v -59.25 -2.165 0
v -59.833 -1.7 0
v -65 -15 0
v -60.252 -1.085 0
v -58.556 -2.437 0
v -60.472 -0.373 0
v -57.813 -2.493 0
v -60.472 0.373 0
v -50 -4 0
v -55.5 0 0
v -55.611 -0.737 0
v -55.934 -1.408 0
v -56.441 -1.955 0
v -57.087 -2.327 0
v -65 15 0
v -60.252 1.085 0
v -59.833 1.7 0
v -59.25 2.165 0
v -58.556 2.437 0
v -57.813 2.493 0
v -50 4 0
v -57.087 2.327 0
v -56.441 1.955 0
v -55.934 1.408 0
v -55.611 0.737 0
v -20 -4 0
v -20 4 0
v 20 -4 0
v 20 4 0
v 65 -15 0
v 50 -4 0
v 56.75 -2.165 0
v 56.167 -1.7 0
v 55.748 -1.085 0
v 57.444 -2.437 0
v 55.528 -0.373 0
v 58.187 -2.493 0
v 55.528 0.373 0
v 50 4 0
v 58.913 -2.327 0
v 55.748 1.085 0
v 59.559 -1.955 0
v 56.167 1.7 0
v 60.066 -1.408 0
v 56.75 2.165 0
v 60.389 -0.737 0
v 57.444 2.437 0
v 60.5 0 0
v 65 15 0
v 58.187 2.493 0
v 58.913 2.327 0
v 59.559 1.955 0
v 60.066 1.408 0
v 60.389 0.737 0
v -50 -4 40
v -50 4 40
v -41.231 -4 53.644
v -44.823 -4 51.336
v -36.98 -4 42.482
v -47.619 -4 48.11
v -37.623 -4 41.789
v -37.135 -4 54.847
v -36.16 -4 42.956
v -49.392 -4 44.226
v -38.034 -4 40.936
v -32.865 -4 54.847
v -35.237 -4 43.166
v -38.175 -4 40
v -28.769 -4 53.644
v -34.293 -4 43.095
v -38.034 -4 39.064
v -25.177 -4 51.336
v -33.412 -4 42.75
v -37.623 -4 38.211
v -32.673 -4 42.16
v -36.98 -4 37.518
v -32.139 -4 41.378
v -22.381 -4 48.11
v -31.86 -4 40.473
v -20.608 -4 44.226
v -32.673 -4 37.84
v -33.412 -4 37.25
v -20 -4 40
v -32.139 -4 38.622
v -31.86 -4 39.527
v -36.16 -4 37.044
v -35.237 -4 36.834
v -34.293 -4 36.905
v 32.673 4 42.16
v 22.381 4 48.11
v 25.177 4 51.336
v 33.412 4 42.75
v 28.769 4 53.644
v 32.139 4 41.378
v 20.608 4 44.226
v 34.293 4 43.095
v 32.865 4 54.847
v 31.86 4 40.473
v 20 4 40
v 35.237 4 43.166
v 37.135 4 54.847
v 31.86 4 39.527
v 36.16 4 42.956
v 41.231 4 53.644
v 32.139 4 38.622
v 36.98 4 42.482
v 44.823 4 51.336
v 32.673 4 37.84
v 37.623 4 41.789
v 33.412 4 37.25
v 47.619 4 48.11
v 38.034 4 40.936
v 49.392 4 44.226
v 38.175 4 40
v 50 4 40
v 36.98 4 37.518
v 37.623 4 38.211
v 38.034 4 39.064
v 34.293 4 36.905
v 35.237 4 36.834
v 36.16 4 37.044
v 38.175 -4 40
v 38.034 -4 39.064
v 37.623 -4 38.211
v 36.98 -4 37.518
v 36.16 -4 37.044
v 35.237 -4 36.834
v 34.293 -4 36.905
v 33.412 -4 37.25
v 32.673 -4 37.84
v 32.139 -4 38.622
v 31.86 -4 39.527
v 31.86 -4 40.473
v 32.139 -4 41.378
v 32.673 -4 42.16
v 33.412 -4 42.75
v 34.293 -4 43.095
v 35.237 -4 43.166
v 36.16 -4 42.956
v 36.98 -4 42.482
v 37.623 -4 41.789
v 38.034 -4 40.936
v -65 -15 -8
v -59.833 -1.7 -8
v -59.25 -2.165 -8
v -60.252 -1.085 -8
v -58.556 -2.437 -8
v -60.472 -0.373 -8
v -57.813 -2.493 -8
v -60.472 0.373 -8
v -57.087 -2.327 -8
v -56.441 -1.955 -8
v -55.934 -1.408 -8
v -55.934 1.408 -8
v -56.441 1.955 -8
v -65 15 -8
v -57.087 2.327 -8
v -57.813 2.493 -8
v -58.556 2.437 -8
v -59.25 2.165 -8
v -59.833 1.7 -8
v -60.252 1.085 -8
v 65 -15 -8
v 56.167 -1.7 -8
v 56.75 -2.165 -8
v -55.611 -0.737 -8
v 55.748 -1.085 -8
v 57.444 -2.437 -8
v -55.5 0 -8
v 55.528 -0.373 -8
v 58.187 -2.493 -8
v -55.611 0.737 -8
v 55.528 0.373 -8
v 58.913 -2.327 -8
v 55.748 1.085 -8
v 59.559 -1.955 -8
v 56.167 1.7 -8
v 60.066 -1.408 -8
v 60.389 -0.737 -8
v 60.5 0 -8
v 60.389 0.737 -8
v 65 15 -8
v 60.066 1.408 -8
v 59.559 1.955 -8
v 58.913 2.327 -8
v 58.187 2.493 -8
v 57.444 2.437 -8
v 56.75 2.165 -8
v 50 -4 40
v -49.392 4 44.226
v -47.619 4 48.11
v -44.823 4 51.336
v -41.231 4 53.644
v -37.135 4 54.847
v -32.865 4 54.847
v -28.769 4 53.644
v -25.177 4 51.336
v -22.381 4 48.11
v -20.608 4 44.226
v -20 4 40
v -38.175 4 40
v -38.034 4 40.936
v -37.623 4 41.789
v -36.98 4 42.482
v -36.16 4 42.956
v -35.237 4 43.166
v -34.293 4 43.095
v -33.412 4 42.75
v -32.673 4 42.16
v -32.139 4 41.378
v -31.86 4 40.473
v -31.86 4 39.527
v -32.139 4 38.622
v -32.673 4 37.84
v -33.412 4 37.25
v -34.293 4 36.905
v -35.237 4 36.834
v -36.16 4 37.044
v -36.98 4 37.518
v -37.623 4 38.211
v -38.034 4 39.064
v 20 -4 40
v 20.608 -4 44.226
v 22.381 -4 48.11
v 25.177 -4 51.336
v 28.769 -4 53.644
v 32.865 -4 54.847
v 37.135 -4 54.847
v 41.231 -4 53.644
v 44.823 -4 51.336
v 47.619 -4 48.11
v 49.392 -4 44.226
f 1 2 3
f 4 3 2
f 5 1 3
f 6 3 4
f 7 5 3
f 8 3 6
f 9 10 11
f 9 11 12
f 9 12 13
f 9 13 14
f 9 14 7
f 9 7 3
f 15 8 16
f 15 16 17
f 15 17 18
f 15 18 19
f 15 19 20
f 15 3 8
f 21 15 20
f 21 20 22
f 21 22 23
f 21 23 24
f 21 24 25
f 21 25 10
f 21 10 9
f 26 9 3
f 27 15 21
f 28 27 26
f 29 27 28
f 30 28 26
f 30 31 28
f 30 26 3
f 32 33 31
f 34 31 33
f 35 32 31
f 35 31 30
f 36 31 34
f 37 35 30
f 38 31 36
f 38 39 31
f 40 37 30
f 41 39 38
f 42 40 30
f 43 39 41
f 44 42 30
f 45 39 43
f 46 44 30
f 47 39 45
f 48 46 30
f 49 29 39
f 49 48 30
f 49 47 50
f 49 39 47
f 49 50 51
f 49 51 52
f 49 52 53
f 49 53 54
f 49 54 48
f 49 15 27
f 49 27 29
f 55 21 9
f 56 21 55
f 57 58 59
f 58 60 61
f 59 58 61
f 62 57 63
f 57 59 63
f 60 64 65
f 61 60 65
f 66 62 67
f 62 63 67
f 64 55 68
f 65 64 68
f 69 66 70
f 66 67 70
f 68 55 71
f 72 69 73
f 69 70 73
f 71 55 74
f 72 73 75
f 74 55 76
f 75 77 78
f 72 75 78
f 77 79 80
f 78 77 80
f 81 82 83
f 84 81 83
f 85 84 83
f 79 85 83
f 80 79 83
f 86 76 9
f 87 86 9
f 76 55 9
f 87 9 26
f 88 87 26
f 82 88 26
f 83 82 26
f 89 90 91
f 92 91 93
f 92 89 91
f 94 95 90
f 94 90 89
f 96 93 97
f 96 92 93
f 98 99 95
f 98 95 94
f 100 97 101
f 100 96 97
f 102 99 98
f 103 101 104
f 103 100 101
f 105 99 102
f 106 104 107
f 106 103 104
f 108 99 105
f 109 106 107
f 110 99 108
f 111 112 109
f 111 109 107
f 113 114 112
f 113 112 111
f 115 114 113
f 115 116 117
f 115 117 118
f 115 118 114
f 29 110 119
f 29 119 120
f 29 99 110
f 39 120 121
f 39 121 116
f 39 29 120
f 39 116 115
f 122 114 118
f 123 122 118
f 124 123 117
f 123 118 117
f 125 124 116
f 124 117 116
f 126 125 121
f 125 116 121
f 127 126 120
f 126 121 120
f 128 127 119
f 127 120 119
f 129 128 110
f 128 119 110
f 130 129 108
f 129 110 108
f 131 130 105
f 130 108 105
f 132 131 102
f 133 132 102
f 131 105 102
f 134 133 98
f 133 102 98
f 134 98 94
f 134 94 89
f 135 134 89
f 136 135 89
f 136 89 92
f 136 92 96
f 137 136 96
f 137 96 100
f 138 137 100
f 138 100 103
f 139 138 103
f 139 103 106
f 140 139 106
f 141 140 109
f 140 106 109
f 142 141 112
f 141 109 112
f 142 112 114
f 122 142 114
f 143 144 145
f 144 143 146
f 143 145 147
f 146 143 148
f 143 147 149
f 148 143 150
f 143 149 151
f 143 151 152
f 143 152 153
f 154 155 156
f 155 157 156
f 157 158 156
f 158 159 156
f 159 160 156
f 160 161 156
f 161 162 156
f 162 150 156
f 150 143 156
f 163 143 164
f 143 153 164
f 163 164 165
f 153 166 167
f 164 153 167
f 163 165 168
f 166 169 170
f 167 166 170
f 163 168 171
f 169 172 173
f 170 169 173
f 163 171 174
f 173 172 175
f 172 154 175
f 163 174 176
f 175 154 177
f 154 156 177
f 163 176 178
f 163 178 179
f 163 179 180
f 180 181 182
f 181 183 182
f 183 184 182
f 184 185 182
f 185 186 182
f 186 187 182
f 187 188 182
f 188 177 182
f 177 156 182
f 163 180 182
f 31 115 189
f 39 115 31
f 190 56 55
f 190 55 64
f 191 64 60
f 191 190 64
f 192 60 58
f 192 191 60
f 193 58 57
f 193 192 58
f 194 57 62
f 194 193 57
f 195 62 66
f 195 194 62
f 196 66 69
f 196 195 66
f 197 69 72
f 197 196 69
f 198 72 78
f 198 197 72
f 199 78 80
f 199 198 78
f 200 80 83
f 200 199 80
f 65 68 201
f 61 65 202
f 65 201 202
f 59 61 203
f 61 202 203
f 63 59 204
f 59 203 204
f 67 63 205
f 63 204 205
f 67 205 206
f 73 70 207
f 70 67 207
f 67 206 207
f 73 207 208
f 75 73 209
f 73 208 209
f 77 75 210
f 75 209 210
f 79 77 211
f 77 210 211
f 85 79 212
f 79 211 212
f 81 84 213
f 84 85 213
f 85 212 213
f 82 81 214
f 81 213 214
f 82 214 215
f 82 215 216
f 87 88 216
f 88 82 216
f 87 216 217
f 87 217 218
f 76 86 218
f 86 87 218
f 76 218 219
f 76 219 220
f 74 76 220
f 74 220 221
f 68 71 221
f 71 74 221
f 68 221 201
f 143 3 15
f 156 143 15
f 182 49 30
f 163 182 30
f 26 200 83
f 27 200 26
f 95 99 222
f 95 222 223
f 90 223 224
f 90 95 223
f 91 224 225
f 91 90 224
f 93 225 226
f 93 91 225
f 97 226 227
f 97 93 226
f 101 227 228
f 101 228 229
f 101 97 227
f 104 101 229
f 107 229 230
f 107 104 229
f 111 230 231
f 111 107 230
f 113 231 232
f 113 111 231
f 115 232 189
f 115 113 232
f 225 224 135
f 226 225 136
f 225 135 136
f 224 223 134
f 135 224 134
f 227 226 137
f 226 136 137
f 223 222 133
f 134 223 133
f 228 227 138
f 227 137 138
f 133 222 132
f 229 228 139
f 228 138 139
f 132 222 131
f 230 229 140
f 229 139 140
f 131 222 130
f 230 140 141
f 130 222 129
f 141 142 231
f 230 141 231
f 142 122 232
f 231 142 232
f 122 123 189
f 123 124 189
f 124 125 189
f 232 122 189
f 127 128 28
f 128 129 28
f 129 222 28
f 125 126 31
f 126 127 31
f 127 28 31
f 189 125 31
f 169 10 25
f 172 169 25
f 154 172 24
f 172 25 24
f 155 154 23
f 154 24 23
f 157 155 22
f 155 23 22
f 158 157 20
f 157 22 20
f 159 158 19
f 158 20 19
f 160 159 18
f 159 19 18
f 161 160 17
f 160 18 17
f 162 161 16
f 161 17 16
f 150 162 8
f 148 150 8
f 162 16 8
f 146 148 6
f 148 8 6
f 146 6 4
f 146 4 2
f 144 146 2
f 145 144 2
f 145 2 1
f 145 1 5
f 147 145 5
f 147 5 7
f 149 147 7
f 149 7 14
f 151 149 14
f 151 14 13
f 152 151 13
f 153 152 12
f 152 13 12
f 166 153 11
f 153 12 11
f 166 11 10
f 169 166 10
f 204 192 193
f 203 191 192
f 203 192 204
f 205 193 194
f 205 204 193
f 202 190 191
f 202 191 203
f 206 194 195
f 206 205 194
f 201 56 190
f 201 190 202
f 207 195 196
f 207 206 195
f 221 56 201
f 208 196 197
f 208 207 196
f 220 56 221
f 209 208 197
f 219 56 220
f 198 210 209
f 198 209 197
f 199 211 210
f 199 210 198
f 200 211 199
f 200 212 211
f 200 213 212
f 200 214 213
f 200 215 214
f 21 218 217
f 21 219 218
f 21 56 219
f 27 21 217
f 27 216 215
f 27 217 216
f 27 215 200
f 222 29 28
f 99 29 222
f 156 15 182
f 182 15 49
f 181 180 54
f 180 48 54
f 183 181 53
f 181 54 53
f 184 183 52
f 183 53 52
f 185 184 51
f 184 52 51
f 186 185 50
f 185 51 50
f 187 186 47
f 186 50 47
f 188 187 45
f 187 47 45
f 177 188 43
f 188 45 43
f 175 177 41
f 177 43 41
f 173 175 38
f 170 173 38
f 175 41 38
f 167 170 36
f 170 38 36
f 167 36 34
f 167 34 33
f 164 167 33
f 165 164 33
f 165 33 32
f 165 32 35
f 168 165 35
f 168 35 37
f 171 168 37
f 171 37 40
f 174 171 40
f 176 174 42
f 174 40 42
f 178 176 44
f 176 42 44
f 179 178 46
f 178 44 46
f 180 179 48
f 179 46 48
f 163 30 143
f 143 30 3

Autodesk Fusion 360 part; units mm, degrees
sketch "草图1" plane through (0, 0, 0) normal (0, 0, 1) x (1, 0, 0)
  line L0 (-65, 15) -> (65, 15)
  line L1 (65, 15) -> (65, -15)
  line L2 (65, -15) -> (-65, -15)
  line L3 (-65, -15) -> (-65, 15)
  line L4 (1.75, 0) -> (22.5, 0)
  line L5 (0, 1.75) -> (0, 22.5)
  circle A0 centre (58, 0) radius 2.5
  circle A1 centre (-58, 0) radius 2.5
  dimension "d1" = 130
  dimension "d2" = 30
  dimension "d16" = 5
  dimension "d17" = 58
  dimension "d18" = 5
extrude "拉伸1" add sketch "草图1" against normal blind 8
ref_plane "工作平面1" through (0, 4, 0) normal (0, 1, 0) x (0, 0, 1)
sketch "草图2" plane through (0, 4, 0) normal (0, 1, 0) x (1, 0, 0)
  line L0 (50, 0) -> (20, 0)
  line L1 (20, 0) -> (20, -40)
  line L2 (20, -40) -> (50, -40)
  line L3 (50, -40) -> (50, 0)
  circle A0 centre (35, -40) radius 15
  circle A1 centre (35, -40) radius 3.175
  dimension "d6" = 30
  dimension "d7" = 40
  dimension "d8" = 20
  dimension "d9" = 6.35
  dimension "d14" = 35
  dimension "d15" = 35
extrude "拉伸2" add sketch "草图2" against normal blind 8 contours L0 L1 L3 A0 | L2 A0 A1 | L2 A0 A1
mirror "镜像1" about plane through (0, 0, 0) normal (1, 0, 0) of bodies 1 merged
equation "d18 = d16"
